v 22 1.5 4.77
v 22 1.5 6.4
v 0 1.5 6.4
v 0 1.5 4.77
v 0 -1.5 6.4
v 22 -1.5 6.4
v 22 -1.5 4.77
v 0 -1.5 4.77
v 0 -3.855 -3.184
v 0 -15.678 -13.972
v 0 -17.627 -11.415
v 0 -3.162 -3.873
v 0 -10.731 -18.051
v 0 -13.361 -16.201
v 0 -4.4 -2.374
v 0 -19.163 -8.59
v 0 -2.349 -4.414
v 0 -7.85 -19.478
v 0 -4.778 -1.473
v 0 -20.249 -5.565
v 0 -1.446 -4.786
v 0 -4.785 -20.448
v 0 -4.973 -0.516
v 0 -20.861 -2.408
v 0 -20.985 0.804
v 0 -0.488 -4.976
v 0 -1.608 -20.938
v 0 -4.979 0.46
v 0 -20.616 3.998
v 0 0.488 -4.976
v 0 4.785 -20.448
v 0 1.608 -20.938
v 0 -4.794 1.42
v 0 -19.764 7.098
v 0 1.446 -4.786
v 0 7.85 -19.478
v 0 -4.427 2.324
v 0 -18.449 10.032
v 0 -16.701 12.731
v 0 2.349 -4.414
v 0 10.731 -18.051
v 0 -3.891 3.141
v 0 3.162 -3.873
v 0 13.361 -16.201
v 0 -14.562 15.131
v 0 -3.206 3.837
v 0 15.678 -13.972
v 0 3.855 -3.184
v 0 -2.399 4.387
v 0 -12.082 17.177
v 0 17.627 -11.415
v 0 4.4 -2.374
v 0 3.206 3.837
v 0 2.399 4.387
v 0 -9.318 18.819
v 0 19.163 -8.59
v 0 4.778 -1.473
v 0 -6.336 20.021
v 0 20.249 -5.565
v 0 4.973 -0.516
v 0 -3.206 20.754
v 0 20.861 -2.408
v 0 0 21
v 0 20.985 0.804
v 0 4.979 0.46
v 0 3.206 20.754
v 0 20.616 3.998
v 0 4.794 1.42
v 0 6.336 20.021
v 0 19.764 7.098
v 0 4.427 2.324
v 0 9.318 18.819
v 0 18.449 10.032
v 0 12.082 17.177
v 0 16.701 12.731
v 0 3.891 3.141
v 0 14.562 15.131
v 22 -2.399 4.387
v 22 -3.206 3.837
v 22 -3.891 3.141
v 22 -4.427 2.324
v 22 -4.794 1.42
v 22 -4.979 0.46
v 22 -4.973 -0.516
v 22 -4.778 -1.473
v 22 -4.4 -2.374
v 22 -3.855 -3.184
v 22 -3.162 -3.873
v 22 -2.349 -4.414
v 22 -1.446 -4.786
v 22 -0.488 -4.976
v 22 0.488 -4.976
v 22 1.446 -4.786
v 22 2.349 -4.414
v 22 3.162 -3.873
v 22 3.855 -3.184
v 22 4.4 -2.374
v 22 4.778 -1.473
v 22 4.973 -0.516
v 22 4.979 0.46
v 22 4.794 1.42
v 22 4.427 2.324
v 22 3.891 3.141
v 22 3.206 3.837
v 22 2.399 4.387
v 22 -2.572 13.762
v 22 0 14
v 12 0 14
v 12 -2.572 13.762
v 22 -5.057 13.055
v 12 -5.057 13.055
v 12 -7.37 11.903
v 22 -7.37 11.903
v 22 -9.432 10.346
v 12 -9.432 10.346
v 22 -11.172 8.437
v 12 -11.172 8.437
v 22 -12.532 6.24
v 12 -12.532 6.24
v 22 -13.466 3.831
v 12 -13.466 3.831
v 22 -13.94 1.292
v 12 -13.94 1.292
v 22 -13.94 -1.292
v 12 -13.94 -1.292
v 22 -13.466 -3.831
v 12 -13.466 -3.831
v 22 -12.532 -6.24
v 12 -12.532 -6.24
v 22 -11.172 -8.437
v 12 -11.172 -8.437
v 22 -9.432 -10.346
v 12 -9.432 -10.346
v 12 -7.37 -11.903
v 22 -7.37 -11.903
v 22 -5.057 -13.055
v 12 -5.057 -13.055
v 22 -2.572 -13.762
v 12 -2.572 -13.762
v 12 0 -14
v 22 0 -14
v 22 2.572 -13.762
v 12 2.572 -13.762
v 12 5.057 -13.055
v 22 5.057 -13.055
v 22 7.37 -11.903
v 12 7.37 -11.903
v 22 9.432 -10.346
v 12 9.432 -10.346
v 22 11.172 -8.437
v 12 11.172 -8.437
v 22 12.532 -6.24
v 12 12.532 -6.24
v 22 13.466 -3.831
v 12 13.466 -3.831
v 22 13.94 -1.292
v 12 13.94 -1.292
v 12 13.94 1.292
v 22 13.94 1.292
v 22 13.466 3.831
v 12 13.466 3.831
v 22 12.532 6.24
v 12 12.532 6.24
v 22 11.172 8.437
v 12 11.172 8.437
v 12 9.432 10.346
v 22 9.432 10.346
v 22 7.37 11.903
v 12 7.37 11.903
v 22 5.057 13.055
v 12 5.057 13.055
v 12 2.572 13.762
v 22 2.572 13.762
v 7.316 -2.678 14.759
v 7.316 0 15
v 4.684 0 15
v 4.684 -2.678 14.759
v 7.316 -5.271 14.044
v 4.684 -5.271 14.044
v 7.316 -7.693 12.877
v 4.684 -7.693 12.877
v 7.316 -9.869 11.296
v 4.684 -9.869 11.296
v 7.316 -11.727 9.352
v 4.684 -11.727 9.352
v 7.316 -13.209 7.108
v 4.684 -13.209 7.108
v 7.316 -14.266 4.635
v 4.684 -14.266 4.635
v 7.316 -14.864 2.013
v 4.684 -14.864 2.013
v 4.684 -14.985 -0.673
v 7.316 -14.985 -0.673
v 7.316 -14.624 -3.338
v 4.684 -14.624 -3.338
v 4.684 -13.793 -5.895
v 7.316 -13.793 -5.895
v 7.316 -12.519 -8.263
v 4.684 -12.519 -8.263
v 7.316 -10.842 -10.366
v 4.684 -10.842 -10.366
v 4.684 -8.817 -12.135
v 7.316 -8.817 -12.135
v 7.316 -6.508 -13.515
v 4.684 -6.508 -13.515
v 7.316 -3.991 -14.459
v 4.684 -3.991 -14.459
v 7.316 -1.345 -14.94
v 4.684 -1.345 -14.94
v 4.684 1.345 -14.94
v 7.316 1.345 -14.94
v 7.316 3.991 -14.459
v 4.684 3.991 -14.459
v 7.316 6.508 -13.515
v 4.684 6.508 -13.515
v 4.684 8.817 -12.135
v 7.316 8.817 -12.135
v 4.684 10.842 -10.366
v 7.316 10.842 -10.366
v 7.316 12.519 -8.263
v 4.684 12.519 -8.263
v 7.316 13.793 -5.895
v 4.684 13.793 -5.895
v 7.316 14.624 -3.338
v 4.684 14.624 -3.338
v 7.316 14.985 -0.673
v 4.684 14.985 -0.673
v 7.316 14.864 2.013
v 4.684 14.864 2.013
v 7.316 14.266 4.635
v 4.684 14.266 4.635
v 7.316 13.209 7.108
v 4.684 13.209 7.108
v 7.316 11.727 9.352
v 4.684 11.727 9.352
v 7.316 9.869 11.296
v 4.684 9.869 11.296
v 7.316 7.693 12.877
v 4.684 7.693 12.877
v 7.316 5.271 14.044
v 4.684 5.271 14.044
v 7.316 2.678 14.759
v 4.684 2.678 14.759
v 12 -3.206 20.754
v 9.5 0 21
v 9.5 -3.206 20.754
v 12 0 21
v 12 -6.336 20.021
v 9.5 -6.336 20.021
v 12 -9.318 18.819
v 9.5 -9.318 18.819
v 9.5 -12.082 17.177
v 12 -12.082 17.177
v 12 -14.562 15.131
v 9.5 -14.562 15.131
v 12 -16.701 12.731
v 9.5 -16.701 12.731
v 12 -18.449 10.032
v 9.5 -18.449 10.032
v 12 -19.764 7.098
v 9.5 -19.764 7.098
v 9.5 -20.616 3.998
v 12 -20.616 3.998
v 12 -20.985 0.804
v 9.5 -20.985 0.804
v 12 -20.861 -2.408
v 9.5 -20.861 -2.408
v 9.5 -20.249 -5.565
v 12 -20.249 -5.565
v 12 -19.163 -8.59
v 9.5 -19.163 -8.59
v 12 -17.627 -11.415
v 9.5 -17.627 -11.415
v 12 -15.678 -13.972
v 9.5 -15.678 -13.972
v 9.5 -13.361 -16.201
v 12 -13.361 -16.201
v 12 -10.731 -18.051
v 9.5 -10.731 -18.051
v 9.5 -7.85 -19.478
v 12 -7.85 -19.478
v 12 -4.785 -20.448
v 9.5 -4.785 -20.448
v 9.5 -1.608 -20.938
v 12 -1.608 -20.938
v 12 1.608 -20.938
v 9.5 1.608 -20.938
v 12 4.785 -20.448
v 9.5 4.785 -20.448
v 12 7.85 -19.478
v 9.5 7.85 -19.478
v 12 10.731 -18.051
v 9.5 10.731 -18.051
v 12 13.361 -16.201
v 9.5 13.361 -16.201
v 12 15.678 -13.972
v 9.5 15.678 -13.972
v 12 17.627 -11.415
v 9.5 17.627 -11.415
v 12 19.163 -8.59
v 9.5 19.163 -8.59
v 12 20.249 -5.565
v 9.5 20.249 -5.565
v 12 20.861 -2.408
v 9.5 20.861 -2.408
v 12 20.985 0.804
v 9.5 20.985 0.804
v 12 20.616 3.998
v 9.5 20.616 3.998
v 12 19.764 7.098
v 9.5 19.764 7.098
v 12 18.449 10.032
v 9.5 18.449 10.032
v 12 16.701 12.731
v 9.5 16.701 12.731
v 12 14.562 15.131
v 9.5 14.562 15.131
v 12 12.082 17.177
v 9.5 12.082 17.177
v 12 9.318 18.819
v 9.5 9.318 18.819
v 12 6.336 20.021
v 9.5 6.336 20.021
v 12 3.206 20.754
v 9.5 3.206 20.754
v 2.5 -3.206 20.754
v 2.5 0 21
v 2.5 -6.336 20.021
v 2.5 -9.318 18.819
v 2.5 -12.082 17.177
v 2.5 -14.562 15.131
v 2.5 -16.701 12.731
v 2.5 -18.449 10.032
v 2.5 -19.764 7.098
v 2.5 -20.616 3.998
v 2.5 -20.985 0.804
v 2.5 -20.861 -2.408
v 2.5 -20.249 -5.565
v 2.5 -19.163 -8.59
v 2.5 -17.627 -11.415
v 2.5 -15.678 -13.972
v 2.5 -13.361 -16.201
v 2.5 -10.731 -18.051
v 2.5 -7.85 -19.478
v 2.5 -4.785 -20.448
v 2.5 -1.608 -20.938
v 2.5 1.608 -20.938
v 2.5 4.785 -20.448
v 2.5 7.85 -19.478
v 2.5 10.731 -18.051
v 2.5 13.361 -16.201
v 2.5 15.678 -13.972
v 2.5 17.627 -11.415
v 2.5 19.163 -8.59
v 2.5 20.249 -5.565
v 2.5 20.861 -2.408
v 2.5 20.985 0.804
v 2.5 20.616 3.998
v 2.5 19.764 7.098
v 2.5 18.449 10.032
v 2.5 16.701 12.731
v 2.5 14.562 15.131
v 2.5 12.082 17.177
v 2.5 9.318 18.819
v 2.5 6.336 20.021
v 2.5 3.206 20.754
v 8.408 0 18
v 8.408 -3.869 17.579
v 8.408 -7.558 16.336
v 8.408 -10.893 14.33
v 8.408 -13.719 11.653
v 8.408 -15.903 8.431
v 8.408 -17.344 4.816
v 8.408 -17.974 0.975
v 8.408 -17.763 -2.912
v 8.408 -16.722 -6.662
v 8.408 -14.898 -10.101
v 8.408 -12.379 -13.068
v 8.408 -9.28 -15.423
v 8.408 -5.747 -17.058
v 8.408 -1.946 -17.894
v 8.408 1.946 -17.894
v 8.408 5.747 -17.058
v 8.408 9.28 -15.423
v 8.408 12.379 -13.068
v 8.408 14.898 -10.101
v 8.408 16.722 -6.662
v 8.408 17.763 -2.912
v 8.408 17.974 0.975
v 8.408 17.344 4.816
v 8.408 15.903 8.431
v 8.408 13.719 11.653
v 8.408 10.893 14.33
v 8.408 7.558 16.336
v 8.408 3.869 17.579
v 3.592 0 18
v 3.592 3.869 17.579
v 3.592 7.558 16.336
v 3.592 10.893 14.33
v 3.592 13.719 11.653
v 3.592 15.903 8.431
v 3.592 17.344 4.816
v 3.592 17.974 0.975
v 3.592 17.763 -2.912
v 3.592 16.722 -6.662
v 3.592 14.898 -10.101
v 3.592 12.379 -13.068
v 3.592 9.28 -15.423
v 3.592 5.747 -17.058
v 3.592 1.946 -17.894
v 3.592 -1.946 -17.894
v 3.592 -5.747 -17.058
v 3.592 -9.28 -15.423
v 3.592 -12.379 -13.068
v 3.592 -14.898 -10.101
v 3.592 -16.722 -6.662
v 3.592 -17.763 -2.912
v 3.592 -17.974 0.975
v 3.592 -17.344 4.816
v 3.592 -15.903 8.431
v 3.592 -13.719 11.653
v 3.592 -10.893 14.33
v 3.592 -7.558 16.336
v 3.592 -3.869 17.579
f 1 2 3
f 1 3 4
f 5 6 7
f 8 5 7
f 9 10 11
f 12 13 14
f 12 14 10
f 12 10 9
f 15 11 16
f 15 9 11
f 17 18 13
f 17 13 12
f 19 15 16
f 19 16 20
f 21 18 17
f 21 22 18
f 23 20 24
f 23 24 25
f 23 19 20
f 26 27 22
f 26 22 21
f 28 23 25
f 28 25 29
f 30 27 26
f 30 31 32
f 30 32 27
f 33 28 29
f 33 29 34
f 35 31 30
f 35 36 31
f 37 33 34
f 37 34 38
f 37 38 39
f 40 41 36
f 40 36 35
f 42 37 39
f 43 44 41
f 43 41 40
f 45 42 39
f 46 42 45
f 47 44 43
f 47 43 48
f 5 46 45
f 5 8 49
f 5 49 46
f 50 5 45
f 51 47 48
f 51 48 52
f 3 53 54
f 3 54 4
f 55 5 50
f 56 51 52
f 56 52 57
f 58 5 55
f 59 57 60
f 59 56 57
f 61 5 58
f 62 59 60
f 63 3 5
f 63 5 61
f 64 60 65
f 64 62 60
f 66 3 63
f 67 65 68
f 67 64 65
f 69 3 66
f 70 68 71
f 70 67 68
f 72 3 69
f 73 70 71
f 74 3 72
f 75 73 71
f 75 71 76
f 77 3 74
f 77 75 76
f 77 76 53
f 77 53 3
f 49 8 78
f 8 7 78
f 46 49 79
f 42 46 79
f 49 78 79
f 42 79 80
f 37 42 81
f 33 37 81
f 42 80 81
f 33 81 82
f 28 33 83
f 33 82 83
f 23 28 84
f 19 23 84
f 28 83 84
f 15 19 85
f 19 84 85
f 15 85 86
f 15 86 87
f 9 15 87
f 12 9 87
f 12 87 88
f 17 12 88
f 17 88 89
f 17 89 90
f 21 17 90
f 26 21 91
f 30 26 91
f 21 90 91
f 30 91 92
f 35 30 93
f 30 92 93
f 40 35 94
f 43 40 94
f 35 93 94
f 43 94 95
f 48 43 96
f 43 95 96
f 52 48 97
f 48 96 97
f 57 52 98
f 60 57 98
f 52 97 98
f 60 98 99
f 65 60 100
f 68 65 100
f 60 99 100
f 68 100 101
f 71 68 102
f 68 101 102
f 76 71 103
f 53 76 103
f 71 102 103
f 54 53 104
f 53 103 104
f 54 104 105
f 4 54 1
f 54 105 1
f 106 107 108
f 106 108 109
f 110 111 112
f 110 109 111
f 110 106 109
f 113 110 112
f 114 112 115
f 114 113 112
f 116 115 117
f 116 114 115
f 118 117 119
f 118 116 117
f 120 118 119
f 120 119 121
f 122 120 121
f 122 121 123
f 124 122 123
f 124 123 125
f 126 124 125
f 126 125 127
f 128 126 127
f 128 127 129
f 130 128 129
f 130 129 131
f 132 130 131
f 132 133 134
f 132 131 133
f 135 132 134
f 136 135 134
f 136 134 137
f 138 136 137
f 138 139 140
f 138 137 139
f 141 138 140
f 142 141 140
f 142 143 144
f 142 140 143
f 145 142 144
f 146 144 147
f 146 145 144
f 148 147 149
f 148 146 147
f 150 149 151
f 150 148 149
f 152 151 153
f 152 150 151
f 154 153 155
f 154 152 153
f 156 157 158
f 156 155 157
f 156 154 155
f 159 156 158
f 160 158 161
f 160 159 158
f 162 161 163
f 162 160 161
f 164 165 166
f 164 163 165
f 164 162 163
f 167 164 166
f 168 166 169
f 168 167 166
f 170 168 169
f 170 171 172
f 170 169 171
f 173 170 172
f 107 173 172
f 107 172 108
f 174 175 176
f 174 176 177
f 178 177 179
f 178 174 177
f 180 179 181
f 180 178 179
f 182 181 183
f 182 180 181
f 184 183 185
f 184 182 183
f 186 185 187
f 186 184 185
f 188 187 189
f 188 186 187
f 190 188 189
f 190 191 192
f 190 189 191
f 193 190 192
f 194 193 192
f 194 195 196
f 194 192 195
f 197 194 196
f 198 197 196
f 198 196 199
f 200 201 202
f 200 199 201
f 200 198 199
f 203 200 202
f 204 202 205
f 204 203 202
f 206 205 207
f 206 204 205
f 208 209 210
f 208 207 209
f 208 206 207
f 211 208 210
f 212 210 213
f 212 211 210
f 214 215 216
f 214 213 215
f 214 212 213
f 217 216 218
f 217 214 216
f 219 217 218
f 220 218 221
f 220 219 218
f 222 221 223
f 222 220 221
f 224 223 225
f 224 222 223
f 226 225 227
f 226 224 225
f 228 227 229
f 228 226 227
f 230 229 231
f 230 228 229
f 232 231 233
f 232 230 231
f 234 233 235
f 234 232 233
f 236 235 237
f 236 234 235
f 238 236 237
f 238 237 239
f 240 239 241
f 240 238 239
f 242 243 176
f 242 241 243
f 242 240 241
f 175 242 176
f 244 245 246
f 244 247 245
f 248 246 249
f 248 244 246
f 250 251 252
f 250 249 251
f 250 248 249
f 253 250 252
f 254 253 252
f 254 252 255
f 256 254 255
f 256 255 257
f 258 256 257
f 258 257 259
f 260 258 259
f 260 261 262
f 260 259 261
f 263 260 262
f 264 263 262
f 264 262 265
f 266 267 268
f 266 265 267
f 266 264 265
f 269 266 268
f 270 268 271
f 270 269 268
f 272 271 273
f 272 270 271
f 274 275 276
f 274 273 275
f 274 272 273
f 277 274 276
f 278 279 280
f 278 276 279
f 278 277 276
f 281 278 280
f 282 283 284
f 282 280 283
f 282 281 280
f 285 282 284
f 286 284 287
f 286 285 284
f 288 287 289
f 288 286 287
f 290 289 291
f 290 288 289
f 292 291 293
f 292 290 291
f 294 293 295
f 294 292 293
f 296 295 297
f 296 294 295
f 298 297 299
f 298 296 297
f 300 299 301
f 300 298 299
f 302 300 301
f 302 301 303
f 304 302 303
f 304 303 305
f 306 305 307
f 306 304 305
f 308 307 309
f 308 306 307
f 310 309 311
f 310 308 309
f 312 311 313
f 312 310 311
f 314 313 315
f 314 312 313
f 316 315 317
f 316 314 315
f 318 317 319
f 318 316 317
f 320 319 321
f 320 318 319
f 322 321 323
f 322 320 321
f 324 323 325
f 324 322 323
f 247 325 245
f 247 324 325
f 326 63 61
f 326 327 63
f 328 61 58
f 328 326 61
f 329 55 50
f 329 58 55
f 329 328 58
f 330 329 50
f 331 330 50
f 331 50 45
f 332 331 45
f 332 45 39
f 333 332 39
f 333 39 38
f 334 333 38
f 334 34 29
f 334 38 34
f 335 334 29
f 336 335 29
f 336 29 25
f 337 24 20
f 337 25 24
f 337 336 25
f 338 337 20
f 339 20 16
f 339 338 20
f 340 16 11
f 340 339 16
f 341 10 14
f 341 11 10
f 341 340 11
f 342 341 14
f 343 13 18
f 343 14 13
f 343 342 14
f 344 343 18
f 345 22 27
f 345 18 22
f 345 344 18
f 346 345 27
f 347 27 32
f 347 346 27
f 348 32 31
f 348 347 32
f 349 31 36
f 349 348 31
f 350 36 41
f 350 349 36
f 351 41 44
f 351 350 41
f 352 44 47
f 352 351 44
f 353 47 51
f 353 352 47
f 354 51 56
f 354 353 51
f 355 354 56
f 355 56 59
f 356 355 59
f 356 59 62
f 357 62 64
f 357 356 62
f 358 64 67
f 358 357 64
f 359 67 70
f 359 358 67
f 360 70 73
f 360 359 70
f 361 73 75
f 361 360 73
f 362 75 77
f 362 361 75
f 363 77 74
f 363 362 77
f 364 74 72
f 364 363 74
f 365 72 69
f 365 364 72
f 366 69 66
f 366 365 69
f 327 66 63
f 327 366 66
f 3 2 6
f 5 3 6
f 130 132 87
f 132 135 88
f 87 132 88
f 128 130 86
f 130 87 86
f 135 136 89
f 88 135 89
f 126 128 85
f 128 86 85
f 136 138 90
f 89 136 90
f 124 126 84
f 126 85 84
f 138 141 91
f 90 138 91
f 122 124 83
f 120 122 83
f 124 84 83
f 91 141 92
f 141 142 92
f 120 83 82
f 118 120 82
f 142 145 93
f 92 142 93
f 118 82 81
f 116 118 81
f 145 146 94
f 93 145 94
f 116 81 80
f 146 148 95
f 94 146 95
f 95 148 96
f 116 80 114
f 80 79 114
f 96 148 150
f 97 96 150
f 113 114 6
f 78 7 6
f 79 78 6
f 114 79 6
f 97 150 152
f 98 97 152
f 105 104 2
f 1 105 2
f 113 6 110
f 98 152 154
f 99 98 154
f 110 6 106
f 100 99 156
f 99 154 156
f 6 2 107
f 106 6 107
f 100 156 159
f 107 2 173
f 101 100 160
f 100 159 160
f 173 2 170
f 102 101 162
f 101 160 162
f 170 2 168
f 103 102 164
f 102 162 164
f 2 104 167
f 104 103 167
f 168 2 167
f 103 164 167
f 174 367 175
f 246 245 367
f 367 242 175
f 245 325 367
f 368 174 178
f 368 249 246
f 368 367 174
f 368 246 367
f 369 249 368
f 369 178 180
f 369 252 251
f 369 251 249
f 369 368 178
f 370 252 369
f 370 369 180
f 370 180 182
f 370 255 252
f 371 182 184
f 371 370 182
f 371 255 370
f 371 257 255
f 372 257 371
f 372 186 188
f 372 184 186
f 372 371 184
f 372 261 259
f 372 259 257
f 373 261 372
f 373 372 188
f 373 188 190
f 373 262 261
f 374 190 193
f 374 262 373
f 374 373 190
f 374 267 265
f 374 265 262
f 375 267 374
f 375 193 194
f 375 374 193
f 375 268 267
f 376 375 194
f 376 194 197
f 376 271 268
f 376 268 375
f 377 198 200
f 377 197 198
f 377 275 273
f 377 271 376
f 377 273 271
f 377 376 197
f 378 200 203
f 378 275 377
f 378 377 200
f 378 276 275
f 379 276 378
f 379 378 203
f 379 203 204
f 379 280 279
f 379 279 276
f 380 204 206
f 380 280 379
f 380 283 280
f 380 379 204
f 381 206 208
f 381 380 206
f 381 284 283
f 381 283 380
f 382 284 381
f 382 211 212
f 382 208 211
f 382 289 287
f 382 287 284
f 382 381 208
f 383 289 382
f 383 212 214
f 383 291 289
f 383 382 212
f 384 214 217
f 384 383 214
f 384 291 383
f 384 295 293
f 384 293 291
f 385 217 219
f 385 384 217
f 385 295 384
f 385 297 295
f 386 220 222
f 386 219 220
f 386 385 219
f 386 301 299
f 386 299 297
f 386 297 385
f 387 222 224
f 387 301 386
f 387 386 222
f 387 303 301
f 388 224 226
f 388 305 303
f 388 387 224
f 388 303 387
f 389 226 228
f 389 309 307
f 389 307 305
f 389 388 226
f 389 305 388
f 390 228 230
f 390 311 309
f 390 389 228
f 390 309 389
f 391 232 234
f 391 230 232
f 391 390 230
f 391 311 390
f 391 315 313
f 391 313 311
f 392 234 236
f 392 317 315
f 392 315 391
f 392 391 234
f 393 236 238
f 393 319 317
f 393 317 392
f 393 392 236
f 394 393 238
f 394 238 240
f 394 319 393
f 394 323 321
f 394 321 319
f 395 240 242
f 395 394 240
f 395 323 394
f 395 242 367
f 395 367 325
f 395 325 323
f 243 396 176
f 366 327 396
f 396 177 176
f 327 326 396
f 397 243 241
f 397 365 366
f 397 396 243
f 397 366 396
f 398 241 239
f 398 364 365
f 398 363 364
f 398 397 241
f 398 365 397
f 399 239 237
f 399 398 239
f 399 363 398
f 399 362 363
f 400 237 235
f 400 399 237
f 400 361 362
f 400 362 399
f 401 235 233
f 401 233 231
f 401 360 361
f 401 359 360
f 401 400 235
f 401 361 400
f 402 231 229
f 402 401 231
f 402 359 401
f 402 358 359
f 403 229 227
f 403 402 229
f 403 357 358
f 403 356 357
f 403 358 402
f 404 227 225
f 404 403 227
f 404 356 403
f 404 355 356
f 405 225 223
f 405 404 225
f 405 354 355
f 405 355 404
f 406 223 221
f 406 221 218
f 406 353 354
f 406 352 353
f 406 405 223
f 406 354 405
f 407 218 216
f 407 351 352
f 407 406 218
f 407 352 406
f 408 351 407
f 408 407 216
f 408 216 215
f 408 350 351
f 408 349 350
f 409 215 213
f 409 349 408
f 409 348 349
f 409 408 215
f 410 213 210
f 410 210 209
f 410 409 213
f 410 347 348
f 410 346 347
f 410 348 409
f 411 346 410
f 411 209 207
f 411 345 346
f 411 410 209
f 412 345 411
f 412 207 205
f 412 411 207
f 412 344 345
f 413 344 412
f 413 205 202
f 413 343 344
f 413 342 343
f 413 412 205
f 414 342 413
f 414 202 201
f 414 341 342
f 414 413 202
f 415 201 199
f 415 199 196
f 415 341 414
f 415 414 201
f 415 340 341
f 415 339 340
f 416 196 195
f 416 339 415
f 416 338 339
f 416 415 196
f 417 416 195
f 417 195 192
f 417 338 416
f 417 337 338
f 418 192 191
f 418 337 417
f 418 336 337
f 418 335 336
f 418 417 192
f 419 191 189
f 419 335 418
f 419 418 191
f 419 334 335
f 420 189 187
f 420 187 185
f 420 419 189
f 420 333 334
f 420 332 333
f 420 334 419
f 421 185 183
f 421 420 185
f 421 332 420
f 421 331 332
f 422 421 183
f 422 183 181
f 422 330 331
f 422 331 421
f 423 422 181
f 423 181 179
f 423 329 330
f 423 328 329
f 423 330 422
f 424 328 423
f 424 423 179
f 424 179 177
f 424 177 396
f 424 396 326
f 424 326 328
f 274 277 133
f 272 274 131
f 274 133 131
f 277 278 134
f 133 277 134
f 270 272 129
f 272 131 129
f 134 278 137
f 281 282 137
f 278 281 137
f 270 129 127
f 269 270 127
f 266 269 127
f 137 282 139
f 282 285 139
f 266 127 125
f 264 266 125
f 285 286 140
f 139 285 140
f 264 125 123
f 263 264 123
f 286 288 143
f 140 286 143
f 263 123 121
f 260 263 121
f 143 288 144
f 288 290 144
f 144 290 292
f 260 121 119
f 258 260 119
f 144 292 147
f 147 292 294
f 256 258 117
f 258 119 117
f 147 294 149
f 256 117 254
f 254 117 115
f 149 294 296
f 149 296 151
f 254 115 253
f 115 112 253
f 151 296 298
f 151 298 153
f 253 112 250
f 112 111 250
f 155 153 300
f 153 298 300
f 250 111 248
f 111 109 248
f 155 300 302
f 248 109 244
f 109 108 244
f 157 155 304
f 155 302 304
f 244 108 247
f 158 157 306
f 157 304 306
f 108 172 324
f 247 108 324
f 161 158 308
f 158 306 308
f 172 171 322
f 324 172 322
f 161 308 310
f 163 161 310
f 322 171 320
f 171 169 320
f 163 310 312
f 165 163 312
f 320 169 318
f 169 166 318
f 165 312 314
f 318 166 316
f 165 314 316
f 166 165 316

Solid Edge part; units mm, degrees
sketch "Sketch1" plane through (0, 0, 0) normal (0, -1, 0) x (1, 0, 0)
  line L0 (22, 14) -> (22, 0)
  line L1 (22, 0) -> (0, 0)
  line L2 (0, 0) -> (0, 21)
  line L3 (0, 21) -> (2.5, 21)
  line L4 (2.5, 21) -> (4.6838, 15)
  line L5 (4.6838, 15) -> (7.3162, 15)
  line L6 (7.3162, 15) -> (9.5, 21)
  line L7 (9.5, 21) -> (12, 21)
  line L8 (12, 21) -> (12, 14)
  line L9 (12, 14) -> (22, 14)
revolve "RevolvedProtrusion1" add sketch "Sketch1" angle 360 about axis through (22, 0, 0) along (-1, 0, 0)
sketch "Sketch2" plane through (0, 0, 0) normal (-1, 0, 0) x (0, 0, 1)
  line L0 (6.4, 1.5) -> (4.7697, 1.5)
  line L1 (6.4, 1.5) -> (6.4, -1.5)
  line L2 (6.4, -1.5) -> (4.7697, -1.5)
  arc A0 (4.7697, -1.5) -> (4.7697, 1.5) centre (0, 0) cw
extrude "Cutout1" cut sketch "Sketch2" along normal mid plane 276.6868
properties material "PVC"
